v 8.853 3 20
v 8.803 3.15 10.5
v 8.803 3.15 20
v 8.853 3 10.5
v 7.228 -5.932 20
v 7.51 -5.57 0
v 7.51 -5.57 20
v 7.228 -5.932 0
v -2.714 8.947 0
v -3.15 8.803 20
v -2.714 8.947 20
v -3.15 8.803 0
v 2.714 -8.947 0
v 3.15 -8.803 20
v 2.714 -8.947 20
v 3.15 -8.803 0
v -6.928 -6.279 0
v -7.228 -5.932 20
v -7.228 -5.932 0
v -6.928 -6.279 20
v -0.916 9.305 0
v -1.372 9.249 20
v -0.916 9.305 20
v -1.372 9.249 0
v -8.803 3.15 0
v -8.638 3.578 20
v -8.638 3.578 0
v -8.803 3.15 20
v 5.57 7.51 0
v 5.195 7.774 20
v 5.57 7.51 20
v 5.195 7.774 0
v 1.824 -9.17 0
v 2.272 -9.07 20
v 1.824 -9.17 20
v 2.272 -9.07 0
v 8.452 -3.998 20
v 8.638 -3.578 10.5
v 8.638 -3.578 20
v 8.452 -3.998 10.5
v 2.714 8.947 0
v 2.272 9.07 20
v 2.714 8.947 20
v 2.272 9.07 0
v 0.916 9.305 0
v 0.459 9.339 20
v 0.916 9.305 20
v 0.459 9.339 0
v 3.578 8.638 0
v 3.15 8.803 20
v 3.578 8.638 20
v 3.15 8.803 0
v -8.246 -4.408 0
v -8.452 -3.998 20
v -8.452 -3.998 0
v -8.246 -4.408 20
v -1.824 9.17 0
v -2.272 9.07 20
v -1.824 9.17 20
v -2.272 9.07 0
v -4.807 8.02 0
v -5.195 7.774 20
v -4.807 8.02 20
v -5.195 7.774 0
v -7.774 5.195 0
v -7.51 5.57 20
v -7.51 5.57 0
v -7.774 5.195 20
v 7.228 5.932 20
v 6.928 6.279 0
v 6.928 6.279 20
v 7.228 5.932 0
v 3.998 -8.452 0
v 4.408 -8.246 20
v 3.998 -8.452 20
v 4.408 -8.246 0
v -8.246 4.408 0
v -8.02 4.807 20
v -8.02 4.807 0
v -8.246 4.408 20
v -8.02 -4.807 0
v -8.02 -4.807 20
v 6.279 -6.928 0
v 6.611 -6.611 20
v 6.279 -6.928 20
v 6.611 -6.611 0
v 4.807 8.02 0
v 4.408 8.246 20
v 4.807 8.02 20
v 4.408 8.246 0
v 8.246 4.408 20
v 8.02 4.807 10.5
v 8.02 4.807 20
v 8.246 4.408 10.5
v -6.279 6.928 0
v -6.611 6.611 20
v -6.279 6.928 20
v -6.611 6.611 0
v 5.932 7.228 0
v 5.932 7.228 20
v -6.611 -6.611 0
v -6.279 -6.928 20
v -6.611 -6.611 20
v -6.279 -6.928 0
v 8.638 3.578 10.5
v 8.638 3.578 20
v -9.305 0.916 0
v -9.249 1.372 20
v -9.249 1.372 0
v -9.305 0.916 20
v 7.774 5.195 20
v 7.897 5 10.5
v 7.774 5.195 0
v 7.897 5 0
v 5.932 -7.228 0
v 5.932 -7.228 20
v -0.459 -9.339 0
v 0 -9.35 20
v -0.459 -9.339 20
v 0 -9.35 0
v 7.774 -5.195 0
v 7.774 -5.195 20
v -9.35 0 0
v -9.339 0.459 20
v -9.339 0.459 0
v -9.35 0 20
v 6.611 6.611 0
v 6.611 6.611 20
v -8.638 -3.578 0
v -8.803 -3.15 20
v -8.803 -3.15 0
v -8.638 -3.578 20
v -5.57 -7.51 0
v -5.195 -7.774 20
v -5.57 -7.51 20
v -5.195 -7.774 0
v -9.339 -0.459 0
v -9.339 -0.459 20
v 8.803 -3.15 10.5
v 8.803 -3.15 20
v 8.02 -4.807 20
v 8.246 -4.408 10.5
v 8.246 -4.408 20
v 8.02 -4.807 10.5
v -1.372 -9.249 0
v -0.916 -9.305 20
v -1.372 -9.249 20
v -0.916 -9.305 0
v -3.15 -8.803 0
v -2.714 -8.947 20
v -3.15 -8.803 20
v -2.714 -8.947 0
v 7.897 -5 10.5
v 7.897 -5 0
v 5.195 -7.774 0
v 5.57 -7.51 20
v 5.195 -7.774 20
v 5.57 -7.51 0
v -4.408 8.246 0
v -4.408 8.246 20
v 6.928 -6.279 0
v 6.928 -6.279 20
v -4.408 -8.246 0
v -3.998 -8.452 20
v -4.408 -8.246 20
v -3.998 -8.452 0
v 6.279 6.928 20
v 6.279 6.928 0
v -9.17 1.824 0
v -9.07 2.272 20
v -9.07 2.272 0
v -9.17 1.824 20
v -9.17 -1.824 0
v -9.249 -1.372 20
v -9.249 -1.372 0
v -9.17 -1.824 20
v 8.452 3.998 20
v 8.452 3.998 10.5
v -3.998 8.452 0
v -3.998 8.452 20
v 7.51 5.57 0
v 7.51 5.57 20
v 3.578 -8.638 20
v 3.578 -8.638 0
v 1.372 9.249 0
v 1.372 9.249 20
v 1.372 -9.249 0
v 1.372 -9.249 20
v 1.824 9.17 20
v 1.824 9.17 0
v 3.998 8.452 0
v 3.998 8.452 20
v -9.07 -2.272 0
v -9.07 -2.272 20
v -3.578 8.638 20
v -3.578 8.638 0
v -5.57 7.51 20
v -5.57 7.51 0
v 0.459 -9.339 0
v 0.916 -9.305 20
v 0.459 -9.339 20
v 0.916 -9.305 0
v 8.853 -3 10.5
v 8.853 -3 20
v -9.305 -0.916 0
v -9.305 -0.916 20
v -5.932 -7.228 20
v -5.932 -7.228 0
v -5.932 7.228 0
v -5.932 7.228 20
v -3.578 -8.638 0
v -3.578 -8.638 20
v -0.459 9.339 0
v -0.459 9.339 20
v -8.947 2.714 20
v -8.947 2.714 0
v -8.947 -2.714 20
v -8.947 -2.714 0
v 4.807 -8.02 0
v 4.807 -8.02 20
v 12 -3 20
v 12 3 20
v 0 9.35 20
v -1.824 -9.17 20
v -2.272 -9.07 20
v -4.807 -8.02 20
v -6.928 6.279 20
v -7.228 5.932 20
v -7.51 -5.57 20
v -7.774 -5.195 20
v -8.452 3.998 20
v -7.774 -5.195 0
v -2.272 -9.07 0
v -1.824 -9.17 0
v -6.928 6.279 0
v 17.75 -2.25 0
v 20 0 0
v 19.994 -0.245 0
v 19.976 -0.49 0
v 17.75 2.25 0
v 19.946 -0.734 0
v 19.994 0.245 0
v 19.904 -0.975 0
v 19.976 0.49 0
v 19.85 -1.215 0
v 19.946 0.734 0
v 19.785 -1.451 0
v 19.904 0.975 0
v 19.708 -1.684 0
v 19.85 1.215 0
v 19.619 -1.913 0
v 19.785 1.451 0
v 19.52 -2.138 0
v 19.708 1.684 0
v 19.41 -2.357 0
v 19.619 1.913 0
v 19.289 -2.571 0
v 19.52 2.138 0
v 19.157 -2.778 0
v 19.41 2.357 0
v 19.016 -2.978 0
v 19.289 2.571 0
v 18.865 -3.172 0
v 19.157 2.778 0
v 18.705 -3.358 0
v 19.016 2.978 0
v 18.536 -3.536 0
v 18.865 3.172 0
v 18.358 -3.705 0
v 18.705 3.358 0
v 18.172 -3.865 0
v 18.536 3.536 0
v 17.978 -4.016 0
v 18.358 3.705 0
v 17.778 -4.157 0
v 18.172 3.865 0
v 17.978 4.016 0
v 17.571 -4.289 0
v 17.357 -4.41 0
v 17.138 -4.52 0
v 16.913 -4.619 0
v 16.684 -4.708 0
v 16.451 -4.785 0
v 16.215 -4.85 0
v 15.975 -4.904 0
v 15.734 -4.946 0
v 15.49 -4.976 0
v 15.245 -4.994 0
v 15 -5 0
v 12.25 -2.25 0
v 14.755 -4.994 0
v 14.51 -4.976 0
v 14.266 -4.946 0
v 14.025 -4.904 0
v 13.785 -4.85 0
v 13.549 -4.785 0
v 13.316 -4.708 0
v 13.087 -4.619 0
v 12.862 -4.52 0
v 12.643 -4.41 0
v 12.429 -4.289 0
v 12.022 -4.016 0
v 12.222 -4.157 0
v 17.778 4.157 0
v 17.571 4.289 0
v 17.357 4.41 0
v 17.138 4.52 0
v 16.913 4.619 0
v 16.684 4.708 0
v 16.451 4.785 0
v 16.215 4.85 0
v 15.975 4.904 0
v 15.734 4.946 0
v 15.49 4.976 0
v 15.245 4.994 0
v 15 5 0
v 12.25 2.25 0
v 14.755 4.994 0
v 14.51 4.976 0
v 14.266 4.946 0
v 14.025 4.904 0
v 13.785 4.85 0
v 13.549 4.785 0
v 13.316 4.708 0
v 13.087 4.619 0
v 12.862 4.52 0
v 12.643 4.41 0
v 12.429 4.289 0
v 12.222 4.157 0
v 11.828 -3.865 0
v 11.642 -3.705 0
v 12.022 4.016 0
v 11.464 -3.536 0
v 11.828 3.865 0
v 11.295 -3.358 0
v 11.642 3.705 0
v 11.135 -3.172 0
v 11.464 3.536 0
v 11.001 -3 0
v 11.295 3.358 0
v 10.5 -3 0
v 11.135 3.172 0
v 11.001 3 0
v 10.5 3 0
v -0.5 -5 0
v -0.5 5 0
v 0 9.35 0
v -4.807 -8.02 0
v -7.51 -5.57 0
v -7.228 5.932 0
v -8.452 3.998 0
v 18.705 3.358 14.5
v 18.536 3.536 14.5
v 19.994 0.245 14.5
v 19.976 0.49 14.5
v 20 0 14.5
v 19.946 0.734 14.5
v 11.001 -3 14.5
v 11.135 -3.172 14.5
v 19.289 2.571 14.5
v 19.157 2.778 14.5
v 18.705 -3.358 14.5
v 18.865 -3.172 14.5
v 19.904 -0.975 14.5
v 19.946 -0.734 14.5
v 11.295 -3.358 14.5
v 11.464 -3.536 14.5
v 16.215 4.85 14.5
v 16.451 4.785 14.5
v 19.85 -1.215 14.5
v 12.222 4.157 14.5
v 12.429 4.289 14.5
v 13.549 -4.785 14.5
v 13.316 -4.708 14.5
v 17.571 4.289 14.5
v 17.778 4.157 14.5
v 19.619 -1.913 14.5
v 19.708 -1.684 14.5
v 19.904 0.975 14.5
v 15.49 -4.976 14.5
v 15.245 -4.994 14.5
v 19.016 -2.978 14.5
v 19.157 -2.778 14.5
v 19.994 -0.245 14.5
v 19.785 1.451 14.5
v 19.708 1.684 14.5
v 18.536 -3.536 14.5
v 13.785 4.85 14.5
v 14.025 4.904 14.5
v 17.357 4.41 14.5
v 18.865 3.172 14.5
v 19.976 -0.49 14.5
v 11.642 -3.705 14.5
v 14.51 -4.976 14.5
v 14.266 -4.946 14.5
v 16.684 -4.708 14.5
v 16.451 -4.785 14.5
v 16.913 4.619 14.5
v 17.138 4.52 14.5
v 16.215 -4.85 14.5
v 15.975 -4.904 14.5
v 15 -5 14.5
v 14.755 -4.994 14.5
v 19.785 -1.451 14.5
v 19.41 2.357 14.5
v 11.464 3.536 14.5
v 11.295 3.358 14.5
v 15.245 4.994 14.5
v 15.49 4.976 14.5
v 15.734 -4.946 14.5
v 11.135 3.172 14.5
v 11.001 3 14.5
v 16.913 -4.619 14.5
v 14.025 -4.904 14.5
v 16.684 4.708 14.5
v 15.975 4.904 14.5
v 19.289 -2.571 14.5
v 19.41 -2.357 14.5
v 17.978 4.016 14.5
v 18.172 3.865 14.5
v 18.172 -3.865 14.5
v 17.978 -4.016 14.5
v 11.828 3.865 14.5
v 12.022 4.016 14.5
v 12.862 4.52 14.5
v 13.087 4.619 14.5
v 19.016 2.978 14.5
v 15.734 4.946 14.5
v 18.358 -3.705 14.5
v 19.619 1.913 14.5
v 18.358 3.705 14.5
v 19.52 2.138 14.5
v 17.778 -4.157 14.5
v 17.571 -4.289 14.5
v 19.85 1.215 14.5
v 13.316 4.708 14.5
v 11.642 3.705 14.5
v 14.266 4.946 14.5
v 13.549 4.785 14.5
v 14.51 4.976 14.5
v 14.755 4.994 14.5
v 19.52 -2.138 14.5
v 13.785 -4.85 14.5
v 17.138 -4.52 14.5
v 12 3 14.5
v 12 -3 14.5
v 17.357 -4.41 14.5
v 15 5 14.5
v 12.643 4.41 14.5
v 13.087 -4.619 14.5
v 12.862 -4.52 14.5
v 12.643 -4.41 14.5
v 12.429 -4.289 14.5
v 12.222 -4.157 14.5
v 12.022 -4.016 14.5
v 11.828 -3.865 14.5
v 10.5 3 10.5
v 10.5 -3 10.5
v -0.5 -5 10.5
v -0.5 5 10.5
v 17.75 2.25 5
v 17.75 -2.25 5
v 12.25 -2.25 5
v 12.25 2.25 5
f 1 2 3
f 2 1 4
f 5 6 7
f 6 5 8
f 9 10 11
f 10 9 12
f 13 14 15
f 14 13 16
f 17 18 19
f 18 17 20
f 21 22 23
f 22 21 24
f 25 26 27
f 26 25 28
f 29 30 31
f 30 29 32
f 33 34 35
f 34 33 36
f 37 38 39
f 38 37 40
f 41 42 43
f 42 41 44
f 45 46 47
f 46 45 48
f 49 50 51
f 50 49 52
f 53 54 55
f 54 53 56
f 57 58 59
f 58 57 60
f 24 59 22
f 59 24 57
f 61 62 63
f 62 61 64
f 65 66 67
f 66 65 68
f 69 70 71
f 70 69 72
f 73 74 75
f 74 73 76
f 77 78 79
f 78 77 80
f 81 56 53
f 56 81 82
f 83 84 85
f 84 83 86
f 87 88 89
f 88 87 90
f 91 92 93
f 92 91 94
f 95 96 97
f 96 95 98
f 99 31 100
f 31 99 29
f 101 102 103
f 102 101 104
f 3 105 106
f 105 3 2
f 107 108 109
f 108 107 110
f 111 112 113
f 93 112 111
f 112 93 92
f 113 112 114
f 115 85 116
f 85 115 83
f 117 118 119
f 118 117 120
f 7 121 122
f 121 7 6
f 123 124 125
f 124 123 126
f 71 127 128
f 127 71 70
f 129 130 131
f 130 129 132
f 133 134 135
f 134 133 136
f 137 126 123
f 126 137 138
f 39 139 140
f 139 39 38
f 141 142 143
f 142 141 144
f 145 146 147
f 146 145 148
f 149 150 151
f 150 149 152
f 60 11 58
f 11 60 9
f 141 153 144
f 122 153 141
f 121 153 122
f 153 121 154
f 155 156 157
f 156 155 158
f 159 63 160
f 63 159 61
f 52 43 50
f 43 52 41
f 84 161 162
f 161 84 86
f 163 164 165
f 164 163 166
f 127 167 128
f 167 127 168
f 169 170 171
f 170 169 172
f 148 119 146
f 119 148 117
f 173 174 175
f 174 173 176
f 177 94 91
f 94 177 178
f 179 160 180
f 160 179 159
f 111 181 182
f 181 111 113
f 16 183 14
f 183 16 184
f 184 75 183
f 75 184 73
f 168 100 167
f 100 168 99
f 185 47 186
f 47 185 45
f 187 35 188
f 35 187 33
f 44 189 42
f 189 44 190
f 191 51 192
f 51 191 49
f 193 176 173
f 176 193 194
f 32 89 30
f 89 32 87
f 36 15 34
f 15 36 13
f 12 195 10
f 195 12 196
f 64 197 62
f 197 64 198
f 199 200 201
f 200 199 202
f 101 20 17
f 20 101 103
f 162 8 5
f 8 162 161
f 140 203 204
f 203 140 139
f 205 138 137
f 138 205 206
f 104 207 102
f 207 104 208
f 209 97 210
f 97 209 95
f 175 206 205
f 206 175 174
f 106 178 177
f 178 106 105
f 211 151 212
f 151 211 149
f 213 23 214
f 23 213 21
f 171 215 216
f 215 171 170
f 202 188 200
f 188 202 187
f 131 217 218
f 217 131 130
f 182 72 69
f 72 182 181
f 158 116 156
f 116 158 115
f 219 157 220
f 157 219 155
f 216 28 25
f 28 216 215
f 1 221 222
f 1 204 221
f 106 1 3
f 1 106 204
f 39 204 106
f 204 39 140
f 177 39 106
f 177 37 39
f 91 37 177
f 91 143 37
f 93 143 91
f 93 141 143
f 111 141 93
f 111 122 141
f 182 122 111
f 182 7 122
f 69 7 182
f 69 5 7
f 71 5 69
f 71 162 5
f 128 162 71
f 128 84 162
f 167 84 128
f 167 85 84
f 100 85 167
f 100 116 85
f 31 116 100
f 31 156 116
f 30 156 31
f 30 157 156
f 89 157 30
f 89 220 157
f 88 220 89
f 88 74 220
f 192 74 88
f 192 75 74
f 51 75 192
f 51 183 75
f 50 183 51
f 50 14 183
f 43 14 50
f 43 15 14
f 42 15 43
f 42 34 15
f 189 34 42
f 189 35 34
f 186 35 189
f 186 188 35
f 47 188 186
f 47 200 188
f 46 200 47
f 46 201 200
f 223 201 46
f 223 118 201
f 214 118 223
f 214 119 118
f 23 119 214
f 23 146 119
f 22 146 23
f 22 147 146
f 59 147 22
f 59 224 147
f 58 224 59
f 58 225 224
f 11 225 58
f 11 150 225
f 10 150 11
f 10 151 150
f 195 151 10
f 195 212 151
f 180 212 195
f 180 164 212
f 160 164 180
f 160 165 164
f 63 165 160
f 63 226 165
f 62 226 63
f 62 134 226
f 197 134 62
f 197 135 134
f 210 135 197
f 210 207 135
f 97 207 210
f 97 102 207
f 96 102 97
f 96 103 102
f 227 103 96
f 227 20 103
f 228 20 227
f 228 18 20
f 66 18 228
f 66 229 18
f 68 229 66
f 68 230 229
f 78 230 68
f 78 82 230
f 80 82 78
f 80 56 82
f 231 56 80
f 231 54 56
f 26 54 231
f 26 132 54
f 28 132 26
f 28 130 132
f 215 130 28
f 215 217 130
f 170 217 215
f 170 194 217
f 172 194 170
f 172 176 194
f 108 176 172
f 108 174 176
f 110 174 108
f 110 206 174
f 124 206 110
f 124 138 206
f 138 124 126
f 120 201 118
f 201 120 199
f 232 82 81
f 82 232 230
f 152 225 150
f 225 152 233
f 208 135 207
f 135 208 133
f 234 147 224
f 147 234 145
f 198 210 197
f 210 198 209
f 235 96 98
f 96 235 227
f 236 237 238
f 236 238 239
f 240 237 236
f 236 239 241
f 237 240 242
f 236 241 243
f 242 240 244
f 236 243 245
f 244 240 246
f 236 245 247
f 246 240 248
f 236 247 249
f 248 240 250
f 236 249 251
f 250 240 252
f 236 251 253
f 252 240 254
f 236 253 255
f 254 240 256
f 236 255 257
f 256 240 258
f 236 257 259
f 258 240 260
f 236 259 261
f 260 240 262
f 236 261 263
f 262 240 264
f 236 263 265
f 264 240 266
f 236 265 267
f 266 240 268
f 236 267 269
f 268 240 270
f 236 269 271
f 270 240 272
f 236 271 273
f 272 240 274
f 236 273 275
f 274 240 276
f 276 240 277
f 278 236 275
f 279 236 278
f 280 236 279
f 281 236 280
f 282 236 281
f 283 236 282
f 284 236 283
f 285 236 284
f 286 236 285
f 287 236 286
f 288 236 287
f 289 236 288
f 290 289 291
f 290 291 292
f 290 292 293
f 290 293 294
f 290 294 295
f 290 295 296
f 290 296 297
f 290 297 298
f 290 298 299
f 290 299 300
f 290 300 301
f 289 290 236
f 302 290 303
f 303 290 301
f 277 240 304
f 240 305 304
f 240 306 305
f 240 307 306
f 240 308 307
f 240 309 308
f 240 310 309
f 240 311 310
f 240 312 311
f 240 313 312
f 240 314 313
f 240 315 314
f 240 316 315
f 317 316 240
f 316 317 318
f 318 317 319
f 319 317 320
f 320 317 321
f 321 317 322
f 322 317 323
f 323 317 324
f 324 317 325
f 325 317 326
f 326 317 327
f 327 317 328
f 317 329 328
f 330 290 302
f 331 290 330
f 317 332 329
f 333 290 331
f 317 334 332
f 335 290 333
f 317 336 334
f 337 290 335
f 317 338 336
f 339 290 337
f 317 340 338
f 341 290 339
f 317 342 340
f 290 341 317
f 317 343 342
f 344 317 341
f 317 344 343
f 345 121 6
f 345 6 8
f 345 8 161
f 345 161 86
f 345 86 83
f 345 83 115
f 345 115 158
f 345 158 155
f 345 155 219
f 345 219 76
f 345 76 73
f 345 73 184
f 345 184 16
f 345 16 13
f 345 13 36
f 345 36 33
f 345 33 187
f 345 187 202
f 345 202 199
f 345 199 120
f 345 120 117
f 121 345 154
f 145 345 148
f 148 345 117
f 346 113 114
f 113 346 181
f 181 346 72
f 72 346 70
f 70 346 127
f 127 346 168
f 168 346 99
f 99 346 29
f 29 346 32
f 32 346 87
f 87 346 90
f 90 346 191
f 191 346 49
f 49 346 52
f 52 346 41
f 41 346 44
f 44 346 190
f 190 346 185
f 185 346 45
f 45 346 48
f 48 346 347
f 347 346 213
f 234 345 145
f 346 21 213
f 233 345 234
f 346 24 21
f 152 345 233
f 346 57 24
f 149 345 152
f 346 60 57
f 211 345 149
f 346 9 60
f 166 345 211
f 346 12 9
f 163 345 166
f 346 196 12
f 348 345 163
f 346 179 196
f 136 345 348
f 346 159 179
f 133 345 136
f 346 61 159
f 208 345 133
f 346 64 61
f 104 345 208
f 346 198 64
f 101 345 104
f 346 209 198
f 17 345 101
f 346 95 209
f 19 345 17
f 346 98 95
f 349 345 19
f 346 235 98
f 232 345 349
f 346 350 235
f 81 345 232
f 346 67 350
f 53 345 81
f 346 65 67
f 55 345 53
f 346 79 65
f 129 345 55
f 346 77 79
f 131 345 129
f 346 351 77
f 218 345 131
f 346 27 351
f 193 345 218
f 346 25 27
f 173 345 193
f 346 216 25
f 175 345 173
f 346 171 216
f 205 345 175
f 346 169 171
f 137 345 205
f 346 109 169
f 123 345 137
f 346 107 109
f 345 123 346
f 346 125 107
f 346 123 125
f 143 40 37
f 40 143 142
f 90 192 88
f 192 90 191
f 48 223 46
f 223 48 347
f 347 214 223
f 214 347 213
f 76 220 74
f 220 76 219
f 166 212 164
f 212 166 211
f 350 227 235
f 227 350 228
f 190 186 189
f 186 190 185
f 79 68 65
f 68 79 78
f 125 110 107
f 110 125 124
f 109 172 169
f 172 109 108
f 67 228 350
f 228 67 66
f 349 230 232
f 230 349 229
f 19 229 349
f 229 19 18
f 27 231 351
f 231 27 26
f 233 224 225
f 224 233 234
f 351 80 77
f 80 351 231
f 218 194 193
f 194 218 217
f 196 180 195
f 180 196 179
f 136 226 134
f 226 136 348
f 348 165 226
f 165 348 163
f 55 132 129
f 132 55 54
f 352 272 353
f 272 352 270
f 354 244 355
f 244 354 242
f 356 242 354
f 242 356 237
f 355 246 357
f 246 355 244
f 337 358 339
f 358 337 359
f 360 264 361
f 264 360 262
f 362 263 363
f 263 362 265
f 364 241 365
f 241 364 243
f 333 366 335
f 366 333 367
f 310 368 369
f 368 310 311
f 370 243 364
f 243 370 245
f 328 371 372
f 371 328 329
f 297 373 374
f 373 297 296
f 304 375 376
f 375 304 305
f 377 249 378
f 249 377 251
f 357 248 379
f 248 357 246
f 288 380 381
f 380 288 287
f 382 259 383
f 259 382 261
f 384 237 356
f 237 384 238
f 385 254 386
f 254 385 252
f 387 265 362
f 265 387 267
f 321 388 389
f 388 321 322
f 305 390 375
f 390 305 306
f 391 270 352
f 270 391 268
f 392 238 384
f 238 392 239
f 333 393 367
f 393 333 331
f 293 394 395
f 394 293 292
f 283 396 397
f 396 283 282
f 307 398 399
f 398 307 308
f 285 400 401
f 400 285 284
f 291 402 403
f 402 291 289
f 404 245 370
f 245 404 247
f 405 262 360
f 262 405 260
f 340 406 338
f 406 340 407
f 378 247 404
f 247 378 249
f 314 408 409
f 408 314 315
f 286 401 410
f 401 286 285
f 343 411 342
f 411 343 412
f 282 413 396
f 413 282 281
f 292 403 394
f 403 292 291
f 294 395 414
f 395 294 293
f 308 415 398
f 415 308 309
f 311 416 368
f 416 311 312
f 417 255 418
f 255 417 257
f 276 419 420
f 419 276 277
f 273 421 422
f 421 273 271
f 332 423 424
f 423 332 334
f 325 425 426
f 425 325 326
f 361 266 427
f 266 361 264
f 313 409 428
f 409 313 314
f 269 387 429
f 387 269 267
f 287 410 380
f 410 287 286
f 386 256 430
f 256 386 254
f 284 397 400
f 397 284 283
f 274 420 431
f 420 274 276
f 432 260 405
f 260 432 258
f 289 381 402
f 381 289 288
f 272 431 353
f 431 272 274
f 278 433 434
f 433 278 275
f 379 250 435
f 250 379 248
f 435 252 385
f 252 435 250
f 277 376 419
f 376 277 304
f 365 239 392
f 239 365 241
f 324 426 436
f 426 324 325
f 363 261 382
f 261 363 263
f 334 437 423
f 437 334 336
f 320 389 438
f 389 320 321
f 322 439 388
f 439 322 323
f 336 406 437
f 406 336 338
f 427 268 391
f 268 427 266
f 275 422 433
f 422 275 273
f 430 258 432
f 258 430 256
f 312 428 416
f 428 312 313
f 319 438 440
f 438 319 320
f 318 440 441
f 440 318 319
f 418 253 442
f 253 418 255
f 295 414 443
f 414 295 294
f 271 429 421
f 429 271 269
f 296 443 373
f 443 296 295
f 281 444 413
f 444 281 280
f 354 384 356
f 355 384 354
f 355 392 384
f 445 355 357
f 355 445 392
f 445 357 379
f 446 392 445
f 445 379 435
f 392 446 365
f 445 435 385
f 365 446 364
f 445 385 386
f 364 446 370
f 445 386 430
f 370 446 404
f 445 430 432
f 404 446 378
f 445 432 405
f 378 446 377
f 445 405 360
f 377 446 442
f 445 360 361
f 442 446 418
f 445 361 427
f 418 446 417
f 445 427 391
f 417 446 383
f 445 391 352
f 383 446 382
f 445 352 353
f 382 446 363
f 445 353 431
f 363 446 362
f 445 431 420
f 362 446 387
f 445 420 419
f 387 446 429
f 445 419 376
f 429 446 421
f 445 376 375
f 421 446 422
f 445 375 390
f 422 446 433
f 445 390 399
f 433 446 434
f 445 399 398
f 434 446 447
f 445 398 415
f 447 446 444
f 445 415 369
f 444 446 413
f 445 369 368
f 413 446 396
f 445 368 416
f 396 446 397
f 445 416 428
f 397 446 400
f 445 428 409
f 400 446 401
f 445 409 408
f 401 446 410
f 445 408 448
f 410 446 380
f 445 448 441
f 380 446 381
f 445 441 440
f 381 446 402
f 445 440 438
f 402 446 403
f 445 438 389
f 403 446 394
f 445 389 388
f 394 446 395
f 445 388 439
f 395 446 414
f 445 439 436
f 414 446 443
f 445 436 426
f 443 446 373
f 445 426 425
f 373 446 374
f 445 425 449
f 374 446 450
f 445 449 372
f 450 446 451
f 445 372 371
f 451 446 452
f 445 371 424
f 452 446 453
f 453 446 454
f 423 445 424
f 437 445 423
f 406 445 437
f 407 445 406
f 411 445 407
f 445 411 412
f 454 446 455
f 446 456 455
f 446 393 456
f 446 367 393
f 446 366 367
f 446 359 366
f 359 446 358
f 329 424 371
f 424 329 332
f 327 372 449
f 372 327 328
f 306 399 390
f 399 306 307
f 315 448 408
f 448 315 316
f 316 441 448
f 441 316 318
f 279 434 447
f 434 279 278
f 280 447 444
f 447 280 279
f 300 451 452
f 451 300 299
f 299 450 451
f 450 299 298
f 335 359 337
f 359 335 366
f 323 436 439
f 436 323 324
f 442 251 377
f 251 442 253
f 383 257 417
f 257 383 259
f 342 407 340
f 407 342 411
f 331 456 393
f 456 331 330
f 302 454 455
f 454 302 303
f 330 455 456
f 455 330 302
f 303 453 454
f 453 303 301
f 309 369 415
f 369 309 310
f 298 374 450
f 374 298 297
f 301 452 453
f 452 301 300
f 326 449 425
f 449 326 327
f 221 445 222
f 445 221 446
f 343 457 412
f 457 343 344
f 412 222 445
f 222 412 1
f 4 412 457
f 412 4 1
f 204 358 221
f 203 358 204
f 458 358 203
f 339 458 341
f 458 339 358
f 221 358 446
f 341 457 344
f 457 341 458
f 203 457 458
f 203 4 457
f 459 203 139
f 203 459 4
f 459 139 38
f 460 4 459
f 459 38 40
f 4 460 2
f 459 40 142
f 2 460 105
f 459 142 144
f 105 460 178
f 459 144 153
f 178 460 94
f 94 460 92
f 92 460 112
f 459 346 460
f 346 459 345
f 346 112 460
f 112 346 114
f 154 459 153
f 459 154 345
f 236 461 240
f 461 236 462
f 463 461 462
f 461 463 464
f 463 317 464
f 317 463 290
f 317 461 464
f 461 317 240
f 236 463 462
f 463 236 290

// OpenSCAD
// Tubing clip for a 12.7 mm (1/2 inch) lab stand rod
// Print orientation: flat on the bed, extruded upward in +Z

// ---------- Parameters ----------
rod_d        = 12.7;   // stand rod diameter
ring_wall    = 3;      // rod ring wall thickness
ring_od      = rod_d + 2 * ring_wall;  // rod ring outer diameter (18.7 mm)
ring_open    = 10;     // rod ring opening width along -X

tube_d       = 6;      // tubing inner diameter
tube_wall    = 2;      // tubing wall thickness
tube_od      = tube_d + 2 * tube_wall;  // tubing outer diameter (10 mm)
tube_x       = 15;     // tubing ring centre X position
tube_open    = 4.5;    // tubing opening width along +X

bridge_x0    = 8;      // bridge start X
bridge_x1    = 12;     // bridge end X
bridge_w     = 6;      // bridge width along Y

eps          = 0.5;    // overcut for clean boolean differences
$fn          = 128;    // circle resolution

// ---------- Model ----------
difference() {
    union() {
        // Rod ring
        translate([0, 0, 0])
            cylinder(d = ring_od, h = ring_open + 10);

        // Tubing ring
        translate([tube_x, 0, 0])
            cylinder(d = tube_od, h = tube_open + 10);

        // Solid bridge between the rings
        translate([bridge_x0, -bridge_w / 2, 0])
            cube([bridge_x1 - bridge_x0, bridge_w, ring_open + 10]);
    }

    // Rod ring opening: removes everything with x < 0 and -5 < y < 5
    translate([-eps, -ring_open / 2, -eps])
        cube([ring_open + 2 * eps, ring_open, ring_open + 2 * eps]);

    // Tubing opening: removes x > 15 with -2.25 < y < 2.25
    translate([tube_x - tube_open / 2 - eps, -tube_open / 2, -eps])
        cube([tube_open + 2 * eps, tube_open, tube_open + 2 * eps]);
}
